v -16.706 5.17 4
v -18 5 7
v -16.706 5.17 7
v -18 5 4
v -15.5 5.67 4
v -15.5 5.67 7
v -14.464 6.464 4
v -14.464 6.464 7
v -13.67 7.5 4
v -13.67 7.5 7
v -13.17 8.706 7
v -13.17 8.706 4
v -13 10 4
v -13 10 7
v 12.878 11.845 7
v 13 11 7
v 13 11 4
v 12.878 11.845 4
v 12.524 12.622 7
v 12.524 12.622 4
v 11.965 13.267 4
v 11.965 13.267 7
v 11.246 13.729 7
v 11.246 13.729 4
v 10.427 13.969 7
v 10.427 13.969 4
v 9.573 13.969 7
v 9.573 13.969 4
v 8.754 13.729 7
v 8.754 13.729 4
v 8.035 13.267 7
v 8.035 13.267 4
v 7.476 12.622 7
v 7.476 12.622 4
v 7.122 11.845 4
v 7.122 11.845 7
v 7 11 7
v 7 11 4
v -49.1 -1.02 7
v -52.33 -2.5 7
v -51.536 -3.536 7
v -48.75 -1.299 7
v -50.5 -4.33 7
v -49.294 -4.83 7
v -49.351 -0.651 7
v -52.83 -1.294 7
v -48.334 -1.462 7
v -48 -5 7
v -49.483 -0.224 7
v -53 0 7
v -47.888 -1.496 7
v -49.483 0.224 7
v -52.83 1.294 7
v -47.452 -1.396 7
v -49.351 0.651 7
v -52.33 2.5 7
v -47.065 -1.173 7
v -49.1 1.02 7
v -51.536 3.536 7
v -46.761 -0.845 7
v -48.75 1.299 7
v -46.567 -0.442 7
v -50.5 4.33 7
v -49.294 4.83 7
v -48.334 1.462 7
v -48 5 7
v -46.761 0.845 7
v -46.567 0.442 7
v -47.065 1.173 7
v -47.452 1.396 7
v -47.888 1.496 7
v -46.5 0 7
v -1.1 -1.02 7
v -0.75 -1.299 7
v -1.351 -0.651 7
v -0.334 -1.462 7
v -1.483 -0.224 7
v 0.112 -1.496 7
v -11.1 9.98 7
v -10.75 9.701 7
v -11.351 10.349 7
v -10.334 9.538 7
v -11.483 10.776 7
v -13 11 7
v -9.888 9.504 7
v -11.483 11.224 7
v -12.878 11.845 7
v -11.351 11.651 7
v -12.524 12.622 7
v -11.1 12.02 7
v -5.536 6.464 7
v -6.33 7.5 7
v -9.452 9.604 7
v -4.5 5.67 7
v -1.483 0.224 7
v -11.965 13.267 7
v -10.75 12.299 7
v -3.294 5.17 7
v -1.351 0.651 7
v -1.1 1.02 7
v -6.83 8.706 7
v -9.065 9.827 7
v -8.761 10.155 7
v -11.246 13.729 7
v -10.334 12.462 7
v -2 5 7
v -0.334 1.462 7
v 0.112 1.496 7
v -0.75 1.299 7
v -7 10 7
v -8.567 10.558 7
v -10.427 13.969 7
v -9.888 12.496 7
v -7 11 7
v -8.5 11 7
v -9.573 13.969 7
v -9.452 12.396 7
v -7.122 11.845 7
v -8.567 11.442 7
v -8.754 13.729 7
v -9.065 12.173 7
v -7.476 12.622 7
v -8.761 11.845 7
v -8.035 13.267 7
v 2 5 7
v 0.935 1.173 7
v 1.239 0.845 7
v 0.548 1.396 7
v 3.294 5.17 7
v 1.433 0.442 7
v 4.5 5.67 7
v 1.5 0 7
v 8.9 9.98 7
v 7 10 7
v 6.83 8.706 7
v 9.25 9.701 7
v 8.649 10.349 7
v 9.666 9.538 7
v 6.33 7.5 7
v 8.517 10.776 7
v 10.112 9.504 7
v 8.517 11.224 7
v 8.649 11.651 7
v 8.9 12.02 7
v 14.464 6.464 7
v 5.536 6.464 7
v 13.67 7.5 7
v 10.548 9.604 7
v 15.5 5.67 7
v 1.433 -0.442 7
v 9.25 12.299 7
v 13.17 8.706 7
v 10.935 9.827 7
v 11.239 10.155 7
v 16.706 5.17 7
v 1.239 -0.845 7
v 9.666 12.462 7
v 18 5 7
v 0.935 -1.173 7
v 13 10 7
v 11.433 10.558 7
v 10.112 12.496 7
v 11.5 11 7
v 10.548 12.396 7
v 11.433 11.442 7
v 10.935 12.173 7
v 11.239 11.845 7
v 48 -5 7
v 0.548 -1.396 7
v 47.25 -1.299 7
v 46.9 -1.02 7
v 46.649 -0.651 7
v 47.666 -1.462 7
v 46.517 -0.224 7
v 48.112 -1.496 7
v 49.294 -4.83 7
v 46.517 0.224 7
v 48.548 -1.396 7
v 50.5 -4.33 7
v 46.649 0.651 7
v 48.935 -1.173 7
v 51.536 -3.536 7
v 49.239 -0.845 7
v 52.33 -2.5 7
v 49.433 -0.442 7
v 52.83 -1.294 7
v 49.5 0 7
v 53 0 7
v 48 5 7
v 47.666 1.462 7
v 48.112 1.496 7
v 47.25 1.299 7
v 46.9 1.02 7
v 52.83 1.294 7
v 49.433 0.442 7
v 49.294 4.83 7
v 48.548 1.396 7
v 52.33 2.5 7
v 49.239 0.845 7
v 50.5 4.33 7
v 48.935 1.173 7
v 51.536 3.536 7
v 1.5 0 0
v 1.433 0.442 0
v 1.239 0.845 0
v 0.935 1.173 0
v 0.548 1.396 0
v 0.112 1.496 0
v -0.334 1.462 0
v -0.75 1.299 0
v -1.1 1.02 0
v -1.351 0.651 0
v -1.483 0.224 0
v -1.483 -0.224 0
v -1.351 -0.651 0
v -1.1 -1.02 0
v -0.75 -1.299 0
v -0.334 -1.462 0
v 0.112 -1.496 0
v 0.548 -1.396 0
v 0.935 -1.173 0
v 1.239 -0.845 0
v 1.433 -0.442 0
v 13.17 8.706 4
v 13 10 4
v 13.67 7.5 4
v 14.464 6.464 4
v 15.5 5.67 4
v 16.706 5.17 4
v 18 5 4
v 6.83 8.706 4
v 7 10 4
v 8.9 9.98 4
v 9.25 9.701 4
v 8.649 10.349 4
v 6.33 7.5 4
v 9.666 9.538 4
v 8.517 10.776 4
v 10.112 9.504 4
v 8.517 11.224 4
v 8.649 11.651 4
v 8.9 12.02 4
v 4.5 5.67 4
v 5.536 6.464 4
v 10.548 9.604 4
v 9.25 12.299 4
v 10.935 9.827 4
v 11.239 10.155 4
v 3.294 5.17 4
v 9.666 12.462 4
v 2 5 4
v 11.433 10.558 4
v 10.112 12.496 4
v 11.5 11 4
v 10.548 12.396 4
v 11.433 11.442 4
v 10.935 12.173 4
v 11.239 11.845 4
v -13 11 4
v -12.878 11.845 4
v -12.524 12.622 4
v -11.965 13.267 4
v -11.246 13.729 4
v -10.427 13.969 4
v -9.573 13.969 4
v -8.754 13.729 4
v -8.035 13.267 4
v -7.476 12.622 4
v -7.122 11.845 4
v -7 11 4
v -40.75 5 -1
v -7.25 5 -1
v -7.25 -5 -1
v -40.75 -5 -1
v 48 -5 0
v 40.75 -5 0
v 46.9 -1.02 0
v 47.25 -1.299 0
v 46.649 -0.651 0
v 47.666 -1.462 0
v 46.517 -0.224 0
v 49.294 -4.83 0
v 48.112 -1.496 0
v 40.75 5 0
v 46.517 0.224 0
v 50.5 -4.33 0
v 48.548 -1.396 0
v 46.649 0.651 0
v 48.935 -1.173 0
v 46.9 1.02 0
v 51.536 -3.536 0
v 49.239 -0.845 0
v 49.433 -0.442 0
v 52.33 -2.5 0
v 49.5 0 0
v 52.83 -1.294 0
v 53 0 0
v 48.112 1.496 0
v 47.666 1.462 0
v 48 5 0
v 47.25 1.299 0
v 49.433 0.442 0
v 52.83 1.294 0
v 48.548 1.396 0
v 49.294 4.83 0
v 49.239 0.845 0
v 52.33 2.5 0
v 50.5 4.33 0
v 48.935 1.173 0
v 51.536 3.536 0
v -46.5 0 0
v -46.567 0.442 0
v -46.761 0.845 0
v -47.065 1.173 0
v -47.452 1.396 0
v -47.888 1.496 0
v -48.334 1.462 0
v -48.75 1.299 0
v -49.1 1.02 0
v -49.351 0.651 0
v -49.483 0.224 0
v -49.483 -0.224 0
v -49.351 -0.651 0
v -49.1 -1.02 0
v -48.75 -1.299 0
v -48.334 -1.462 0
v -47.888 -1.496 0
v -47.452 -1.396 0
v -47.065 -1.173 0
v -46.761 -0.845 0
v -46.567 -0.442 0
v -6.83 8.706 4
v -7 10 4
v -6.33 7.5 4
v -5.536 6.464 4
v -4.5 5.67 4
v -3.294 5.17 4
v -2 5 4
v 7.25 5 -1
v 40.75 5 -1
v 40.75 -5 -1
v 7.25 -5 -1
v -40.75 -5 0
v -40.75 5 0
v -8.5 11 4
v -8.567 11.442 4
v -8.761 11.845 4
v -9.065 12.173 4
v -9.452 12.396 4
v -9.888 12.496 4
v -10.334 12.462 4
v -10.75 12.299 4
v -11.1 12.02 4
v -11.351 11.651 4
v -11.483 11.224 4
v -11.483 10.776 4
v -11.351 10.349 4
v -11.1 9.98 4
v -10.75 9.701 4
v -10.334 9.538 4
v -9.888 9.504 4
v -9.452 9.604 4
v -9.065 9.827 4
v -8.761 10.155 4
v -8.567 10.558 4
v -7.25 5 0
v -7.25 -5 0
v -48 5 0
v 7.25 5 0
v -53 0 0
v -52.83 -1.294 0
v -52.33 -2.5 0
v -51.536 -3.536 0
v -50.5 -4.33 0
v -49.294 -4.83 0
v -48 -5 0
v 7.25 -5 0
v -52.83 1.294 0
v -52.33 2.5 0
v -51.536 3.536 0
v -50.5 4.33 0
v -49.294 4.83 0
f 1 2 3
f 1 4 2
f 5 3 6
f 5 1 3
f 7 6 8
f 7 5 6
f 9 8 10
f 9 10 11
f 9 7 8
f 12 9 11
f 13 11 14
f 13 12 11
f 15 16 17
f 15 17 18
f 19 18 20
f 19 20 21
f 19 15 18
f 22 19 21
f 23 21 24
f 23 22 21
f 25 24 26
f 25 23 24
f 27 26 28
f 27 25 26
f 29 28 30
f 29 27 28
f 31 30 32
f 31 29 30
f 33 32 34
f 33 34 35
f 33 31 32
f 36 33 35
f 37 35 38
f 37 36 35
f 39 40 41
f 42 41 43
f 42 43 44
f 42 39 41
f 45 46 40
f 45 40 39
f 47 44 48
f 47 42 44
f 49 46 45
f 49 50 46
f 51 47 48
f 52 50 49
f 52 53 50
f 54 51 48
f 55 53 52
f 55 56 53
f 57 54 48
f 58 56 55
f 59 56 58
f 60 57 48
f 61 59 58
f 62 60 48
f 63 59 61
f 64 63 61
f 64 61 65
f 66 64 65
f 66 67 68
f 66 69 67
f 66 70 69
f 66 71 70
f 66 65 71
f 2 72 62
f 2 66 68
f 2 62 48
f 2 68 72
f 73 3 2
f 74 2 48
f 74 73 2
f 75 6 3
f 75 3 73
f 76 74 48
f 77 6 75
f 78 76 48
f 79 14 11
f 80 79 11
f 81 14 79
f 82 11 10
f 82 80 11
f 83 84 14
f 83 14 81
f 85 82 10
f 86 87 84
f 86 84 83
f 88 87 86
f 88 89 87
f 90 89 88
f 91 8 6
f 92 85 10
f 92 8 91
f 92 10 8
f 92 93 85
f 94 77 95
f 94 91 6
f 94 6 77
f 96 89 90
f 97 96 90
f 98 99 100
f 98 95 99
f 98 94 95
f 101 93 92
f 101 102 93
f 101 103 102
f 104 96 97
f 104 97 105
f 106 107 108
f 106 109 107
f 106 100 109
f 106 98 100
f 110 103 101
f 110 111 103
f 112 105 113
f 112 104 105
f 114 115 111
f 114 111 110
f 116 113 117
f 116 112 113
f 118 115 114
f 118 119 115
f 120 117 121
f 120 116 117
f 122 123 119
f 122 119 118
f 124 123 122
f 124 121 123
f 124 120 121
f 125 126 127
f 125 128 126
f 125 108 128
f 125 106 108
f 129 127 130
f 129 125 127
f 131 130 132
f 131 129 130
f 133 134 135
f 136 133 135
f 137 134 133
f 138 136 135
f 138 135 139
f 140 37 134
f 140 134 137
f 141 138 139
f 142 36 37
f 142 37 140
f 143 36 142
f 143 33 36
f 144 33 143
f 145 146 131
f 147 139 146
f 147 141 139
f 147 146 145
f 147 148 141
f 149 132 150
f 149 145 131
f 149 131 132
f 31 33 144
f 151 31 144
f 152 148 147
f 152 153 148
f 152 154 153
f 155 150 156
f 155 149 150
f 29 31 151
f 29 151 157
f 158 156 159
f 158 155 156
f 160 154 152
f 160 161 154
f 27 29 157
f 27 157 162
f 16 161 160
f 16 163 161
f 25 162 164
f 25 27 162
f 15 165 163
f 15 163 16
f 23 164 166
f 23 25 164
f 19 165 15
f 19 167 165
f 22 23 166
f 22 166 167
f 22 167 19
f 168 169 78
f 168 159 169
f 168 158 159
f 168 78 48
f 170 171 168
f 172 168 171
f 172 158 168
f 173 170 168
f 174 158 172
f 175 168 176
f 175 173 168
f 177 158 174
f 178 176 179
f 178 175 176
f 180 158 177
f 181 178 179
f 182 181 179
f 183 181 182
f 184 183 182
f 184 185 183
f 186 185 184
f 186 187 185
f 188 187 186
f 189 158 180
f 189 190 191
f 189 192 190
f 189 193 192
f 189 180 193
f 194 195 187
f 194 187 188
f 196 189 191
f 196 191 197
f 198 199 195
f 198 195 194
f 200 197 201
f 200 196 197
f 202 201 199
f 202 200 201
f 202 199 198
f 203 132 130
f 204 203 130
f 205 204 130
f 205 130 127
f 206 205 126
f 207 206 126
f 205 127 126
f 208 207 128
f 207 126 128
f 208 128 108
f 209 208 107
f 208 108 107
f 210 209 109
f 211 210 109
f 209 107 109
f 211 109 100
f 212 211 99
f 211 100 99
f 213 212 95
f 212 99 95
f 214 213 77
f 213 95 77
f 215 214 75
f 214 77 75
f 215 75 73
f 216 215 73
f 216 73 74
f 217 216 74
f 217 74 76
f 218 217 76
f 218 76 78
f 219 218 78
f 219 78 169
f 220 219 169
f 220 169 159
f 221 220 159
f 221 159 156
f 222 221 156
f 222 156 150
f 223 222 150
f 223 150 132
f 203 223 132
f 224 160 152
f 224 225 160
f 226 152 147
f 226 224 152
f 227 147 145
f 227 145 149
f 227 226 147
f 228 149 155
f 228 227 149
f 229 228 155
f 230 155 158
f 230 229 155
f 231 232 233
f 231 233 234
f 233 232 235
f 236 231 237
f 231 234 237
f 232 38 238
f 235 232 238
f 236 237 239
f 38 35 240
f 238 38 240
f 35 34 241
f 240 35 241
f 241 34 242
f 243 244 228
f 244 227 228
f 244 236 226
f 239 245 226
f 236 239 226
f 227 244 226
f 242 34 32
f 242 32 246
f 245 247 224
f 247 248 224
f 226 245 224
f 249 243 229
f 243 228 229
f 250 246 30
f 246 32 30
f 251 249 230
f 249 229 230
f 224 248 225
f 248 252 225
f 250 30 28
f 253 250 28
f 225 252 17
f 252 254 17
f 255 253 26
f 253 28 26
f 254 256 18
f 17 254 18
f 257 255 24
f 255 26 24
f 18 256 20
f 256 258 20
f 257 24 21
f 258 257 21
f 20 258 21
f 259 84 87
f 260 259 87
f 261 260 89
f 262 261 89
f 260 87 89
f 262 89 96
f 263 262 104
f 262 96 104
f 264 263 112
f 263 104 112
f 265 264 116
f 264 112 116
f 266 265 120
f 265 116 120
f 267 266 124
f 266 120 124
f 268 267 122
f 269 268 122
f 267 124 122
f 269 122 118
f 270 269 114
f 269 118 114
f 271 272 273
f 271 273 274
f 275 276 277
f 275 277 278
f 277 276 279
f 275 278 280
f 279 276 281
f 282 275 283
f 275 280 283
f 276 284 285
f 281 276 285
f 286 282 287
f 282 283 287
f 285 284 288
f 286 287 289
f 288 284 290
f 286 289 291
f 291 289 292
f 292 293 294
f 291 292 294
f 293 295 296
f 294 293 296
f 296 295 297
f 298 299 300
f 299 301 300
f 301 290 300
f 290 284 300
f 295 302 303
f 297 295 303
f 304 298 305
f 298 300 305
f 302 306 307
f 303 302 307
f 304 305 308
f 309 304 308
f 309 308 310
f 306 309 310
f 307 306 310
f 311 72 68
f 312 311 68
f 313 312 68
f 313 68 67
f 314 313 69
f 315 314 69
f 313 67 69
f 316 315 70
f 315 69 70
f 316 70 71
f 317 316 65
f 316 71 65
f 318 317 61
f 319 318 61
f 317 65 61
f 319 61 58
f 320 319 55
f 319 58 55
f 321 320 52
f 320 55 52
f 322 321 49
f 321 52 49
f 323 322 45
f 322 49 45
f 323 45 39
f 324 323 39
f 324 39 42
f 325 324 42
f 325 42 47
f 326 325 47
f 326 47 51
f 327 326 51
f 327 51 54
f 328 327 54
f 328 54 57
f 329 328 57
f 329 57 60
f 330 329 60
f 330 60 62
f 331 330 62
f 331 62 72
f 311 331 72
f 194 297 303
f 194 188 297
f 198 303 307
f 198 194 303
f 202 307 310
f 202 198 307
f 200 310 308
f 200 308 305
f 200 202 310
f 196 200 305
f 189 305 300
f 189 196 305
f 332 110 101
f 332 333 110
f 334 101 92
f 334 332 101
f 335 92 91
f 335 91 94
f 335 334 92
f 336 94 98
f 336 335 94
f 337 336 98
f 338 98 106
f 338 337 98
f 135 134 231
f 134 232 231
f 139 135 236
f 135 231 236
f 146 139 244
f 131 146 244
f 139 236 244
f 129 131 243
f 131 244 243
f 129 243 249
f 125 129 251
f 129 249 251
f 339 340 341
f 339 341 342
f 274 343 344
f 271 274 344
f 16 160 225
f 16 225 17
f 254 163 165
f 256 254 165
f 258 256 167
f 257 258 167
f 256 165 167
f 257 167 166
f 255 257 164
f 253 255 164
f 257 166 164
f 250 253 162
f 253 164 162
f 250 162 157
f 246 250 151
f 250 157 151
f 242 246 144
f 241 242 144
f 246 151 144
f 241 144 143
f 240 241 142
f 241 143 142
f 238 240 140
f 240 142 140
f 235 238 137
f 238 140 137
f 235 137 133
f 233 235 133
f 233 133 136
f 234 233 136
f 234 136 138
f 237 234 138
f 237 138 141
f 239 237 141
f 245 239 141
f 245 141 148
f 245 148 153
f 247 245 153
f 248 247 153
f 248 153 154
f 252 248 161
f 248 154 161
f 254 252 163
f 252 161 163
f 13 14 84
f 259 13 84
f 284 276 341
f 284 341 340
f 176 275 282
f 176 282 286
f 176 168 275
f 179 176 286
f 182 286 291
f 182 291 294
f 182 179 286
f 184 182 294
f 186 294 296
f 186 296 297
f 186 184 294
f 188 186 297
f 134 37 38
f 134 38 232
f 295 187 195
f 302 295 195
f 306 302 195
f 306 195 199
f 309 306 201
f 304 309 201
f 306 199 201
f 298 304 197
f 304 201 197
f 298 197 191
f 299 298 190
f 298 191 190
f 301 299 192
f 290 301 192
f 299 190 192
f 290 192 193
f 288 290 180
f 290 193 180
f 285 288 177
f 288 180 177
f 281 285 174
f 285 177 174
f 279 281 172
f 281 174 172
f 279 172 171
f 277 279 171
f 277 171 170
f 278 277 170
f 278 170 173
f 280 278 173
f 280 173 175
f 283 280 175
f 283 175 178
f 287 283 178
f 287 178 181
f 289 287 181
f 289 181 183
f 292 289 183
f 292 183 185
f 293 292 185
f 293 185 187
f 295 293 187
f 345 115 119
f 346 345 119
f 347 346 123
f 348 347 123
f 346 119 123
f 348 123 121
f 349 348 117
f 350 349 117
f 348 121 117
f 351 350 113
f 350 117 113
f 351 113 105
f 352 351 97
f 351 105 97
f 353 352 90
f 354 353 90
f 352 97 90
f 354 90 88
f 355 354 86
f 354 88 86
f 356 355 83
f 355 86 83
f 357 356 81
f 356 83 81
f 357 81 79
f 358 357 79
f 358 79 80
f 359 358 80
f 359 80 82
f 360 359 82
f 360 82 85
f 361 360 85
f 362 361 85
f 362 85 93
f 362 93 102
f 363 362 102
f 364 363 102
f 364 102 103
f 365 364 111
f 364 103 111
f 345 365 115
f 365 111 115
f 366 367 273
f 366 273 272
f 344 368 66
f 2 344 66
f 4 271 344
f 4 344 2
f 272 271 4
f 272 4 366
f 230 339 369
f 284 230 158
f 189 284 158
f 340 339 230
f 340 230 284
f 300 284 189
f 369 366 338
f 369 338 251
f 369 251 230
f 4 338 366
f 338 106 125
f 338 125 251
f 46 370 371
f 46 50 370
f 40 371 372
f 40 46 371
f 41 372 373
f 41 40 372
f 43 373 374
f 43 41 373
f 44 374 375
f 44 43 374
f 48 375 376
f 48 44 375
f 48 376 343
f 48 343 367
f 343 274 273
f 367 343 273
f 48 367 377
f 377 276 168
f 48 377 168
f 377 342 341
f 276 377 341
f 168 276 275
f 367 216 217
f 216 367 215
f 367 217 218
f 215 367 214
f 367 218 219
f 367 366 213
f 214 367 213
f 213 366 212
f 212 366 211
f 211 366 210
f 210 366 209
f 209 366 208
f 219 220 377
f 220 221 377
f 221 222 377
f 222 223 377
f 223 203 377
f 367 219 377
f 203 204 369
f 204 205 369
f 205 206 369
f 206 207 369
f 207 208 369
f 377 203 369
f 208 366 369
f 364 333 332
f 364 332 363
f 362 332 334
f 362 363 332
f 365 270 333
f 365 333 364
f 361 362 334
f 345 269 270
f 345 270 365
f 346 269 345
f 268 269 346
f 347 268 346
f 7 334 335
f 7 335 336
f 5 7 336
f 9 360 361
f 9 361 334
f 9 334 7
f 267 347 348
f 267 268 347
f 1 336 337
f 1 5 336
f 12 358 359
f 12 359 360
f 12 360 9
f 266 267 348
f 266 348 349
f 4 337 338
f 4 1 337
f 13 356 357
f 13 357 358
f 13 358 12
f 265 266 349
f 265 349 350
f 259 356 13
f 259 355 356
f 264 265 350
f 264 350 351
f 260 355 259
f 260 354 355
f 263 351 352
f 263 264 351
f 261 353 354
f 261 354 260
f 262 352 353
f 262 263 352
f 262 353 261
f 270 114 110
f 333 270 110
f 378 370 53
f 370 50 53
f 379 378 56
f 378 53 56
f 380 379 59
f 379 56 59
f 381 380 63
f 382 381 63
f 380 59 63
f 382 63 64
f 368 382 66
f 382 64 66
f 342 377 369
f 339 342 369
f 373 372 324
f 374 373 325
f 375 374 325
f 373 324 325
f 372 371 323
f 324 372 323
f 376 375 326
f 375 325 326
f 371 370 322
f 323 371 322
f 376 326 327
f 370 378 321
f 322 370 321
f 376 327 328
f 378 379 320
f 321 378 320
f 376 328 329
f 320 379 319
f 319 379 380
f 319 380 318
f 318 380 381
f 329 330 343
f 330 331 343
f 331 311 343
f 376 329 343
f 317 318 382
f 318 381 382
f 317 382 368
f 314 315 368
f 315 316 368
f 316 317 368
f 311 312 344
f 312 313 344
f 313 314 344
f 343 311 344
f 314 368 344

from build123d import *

# Parameters (mm, degrees)
SKETCH1_W           = 106
SKETCH1_H           = 10
BOSS_EXTRUDE1_DEPTH = 7
FILLET1_R           = 5
SKETCH2_R           = 1.5
CUT_EXTRUDE1_DEPTH  = 54.693575035
SKETCH3_R           = 1.5
BOSS_EXTRUDE2_DEPTH = 3
FILLET2_R           = 5
FILLET3_R           = 5
FILLET4_R           = 5
SKETCH4_W           = 33.5
SKETCH4_H           = 10
BOSS_EXTRUDE3_DEPTH = 1


with BuildPart() as part:
    # Sketch1 → Boss-Extrude1 (new body)
    with BuildSketch(Plane.XY):
        Rectangle(SKETCH1_W, SKETCH1_H)
    extrude(amount=BOSS_EXTRUDE1_DEPTH)

    # Fillet1
    fillet1_edges = [part.edges().sort_by_distance(p)[0] for p in [
        (-53, -5, 3.5),
        (53, -5, 3.5),
        (53, 5, 3.5),
        (-53, 5, 3.5),
    ]]
    fillet(fillet1_edges, radius=FILLET1_R - 0.0001)  # a hair under: the kernel refuses the full size

    # Sketch2 → Cut-Extrude1 (cut, through all)
    with BuildSketch(Plane.XY.offset(7)):
        with Locations((-48, 0)):
            Circle(SKETCH2_R)
        with Locations((48, 0)):
            Circle(SKETCH2_R)
        Circle(SKETCH2_R)
    extrude(amount=-CUT_EXTRUDE1_DEPTH, mode=Mode.SUBTRACT)

    # Sketch3 → Boss-Extrude2 (add)
    # profile 1 of 2: a face of its own
    with BuildSketch(Plane.XY.offset(7)):
        with BuildLine():
            Line((7, 11), (7, 5))
            Line((7, 5), (13, 5))
            Line((13, 5), (13, 11))
            ThreePointArc((13, 11), (10, 14), (7, 11))
        make_face()
        with Locations((10, 11)):
            Circle(SKETCH3_R, mode=Mode.SUBTRACT)
    # profile 2 of 2: a face of its own
    with BuildSketch(Plane.XY.offset(7)):
        with BuildLine():
            Line((-7, 11), (-7, 5))
            Line((-7, 5), (-13, 5))
            Line((-13, 5), (-13, 11))
            ThreePointArc((-13, 11), (-10, 14), (-7, 11))
        make_face()
        with Locations((-10, 11)):
            Circle(SKETCH3_R, mode=Mode.SUBTRACT)
    extrude(amount=-BOSS_EXTRUDE2_DEPTH)

    # Fillet2
    fillet2_edges = [part.edges().sort_by_distance(p)[0] for p in [
        (-13, 5, 5.5),
    ]]
    fillet(fillet2_edges, radius=FILLET2_R)

    # Fillet3
    fillet3_edges = [part.edges().sort_by_distance(p)[0] for p in [
        (7, 5, 5.5),
        (-7, 5, 5.5),
    ]]
    fillet(fillet3_edges, radius=FILLET3_R)

    # Fillet4
    fillet4_edges = [part.edges().sort_by_distance(p)[0] for p in [
        (13, 5, 5.5),
    ]]
    fillet(fillet4_edges, radius=FILLET4_R)

    # Sketch4 → Boss-Extrude3 (add)
    with BuildSketch(Plane(origin=(0, 0, 0), x_dir=(-1, 0, 0), z_dir=(0, 0, -1))):
        with Locations((-24, 0)):
            Rectangle(SKETCH4_W, SKETCH4_H)
        with Locations((24, 0)):
            Rectangle(SKETCH4_W, SKETCH4_H)
    extrude(amount=BOSS_EXTRUDE3_DEPTH)


solid = part.part
